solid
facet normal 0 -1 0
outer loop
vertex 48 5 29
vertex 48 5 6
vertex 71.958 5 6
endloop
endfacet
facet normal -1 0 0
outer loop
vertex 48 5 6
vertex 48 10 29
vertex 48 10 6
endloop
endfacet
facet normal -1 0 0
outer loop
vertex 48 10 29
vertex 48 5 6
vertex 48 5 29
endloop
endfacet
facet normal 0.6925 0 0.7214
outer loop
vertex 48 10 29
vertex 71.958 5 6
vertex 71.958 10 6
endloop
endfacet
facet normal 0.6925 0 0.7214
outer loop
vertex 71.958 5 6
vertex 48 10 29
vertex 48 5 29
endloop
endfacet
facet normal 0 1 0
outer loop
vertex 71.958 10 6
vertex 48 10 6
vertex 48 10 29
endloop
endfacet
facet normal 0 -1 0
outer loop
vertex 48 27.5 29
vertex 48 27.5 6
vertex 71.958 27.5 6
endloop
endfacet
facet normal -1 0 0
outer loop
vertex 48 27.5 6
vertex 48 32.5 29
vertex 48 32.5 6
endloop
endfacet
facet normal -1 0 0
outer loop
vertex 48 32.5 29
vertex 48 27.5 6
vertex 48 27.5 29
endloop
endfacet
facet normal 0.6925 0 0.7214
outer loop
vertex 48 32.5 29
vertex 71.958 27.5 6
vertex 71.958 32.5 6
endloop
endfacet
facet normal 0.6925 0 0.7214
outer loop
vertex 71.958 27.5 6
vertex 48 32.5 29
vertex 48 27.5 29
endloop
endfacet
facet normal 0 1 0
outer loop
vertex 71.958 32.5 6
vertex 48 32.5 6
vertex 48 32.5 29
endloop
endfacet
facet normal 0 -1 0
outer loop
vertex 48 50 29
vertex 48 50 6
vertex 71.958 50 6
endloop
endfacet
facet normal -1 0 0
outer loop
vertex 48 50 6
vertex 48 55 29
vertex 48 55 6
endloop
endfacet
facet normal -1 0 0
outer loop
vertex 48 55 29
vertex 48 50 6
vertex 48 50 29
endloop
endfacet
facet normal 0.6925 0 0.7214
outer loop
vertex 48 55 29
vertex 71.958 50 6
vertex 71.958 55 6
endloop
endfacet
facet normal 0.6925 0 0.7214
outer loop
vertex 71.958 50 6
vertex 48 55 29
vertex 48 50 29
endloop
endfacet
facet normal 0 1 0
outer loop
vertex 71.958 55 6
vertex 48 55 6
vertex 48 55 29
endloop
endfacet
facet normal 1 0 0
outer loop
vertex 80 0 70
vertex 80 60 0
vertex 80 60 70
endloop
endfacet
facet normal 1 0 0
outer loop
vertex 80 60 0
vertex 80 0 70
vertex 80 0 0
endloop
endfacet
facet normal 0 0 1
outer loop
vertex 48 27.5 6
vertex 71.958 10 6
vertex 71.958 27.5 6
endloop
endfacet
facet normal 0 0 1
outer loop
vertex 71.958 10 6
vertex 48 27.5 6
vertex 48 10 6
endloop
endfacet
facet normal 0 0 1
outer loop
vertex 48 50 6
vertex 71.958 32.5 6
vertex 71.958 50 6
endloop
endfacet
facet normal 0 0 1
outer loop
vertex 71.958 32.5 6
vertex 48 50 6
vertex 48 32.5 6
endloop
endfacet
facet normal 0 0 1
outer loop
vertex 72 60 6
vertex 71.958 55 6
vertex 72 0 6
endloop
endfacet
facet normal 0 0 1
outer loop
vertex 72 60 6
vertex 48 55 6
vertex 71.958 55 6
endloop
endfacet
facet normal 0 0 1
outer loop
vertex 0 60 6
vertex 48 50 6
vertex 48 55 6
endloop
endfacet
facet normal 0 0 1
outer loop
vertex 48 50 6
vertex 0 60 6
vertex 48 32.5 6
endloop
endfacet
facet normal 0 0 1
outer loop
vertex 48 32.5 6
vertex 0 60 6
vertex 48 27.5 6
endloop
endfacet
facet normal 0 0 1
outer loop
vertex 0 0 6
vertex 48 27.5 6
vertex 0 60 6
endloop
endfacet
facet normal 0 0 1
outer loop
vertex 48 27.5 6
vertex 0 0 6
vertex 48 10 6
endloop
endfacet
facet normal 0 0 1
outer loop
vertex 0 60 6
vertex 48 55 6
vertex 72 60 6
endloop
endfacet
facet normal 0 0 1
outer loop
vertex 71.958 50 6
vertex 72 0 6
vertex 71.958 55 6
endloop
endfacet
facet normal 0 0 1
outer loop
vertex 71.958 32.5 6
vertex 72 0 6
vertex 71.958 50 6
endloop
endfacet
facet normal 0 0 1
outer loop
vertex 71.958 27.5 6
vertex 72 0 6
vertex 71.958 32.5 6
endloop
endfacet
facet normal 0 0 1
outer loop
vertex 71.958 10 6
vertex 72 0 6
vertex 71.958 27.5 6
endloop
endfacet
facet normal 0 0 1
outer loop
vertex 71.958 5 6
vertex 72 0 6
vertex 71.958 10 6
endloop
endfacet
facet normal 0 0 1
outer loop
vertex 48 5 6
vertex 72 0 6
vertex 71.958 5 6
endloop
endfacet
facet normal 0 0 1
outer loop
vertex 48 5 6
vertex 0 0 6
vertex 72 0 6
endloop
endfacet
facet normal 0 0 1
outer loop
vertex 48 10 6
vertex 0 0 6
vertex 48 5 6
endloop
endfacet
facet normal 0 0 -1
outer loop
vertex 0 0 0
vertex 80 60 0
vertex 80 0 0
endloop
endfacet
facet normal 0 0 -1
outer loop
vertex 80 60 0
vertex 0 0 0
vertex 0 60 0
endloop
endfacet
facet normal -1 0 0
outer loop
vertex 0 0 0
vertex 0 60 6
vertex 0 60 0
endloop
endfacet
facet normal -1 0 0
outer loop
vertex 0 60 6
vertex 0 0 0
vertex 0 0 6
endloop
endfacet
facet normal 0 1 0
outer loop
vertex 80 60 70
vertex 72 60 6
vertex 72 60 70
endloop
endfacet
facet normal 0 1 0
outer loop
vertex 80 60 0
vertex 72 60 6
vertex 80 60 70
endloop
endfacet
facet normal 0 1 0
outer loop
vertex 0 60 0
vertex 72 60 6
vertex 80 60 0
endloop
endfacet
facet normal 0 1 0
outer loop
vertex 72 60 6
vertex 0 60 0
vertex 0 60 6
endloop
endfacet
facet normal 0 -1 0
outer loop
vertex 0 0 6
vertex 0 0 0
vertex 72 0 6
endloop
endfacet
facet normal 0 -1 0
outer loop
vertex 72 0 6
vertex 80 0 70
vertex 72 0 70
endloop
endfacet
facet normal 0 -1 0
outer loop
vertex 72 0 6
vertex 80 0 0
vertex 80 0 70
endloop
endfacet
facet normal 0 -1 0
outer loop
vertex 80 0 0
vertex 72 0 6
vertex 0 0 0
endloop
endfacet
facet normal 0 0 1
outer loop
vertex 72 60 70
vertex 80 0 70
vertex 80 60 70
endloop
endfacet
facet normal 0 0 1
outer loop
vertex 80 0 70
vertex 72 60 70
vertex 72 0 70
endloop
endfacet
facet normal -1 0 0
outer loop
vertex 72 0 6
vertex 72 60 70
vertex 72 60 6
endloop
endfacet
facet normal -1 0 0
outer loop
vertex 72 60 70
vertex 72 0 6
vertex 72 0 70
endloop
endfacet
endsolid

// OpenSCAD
$fn = 32;

// ----------------------------------------------------------------------
// Rib bracket: 3-gusset L bracket
// ----------------------------------------------------------------------

// --- parameters (mm) ---
base_l = 80;              // foot length, X
base_w = 60;              // foot width, Y
base_t = 6;               // foot thickness
plate_t = 8;              // upright plate thickness
plate_h = 70;             // overall height
gus_l = 24;               // gusset leg along the foot
gus_h = 24;               // gusset height
gus_t = 5;                // gusset thickness
gus_edge = 5;             // gusset margin from the foot edge
n_gus = 3;                // gusset count
fit_tol = 0.02;           // tolerance for press fits, mm
free_tol = 0.2;           // tolerance for clearance fits, mm

gus_pitch = (base_w - 2 * gus_edge - gus_t) / (n_gus - 1);  // gusset pitch

union() {
  cube([base_l, base_w, base_t]);
  translate([base_l - plate_t, 0, base_t - 1])
    cube([plate_t, base_w, plate_h - base_t + 1]);
  for (i = [0 : n_gus - 1])
    translate([base_l - plate_t - gus_l, gus_edge + i * gus_pitch, base_t - 1])
      rotate([-90, 0, 0])
        linear_extrude(height = gus_t)
          polygon(points = [[0, 0], [gus_l + 1, 0], [0, -gus_h]]);
}
